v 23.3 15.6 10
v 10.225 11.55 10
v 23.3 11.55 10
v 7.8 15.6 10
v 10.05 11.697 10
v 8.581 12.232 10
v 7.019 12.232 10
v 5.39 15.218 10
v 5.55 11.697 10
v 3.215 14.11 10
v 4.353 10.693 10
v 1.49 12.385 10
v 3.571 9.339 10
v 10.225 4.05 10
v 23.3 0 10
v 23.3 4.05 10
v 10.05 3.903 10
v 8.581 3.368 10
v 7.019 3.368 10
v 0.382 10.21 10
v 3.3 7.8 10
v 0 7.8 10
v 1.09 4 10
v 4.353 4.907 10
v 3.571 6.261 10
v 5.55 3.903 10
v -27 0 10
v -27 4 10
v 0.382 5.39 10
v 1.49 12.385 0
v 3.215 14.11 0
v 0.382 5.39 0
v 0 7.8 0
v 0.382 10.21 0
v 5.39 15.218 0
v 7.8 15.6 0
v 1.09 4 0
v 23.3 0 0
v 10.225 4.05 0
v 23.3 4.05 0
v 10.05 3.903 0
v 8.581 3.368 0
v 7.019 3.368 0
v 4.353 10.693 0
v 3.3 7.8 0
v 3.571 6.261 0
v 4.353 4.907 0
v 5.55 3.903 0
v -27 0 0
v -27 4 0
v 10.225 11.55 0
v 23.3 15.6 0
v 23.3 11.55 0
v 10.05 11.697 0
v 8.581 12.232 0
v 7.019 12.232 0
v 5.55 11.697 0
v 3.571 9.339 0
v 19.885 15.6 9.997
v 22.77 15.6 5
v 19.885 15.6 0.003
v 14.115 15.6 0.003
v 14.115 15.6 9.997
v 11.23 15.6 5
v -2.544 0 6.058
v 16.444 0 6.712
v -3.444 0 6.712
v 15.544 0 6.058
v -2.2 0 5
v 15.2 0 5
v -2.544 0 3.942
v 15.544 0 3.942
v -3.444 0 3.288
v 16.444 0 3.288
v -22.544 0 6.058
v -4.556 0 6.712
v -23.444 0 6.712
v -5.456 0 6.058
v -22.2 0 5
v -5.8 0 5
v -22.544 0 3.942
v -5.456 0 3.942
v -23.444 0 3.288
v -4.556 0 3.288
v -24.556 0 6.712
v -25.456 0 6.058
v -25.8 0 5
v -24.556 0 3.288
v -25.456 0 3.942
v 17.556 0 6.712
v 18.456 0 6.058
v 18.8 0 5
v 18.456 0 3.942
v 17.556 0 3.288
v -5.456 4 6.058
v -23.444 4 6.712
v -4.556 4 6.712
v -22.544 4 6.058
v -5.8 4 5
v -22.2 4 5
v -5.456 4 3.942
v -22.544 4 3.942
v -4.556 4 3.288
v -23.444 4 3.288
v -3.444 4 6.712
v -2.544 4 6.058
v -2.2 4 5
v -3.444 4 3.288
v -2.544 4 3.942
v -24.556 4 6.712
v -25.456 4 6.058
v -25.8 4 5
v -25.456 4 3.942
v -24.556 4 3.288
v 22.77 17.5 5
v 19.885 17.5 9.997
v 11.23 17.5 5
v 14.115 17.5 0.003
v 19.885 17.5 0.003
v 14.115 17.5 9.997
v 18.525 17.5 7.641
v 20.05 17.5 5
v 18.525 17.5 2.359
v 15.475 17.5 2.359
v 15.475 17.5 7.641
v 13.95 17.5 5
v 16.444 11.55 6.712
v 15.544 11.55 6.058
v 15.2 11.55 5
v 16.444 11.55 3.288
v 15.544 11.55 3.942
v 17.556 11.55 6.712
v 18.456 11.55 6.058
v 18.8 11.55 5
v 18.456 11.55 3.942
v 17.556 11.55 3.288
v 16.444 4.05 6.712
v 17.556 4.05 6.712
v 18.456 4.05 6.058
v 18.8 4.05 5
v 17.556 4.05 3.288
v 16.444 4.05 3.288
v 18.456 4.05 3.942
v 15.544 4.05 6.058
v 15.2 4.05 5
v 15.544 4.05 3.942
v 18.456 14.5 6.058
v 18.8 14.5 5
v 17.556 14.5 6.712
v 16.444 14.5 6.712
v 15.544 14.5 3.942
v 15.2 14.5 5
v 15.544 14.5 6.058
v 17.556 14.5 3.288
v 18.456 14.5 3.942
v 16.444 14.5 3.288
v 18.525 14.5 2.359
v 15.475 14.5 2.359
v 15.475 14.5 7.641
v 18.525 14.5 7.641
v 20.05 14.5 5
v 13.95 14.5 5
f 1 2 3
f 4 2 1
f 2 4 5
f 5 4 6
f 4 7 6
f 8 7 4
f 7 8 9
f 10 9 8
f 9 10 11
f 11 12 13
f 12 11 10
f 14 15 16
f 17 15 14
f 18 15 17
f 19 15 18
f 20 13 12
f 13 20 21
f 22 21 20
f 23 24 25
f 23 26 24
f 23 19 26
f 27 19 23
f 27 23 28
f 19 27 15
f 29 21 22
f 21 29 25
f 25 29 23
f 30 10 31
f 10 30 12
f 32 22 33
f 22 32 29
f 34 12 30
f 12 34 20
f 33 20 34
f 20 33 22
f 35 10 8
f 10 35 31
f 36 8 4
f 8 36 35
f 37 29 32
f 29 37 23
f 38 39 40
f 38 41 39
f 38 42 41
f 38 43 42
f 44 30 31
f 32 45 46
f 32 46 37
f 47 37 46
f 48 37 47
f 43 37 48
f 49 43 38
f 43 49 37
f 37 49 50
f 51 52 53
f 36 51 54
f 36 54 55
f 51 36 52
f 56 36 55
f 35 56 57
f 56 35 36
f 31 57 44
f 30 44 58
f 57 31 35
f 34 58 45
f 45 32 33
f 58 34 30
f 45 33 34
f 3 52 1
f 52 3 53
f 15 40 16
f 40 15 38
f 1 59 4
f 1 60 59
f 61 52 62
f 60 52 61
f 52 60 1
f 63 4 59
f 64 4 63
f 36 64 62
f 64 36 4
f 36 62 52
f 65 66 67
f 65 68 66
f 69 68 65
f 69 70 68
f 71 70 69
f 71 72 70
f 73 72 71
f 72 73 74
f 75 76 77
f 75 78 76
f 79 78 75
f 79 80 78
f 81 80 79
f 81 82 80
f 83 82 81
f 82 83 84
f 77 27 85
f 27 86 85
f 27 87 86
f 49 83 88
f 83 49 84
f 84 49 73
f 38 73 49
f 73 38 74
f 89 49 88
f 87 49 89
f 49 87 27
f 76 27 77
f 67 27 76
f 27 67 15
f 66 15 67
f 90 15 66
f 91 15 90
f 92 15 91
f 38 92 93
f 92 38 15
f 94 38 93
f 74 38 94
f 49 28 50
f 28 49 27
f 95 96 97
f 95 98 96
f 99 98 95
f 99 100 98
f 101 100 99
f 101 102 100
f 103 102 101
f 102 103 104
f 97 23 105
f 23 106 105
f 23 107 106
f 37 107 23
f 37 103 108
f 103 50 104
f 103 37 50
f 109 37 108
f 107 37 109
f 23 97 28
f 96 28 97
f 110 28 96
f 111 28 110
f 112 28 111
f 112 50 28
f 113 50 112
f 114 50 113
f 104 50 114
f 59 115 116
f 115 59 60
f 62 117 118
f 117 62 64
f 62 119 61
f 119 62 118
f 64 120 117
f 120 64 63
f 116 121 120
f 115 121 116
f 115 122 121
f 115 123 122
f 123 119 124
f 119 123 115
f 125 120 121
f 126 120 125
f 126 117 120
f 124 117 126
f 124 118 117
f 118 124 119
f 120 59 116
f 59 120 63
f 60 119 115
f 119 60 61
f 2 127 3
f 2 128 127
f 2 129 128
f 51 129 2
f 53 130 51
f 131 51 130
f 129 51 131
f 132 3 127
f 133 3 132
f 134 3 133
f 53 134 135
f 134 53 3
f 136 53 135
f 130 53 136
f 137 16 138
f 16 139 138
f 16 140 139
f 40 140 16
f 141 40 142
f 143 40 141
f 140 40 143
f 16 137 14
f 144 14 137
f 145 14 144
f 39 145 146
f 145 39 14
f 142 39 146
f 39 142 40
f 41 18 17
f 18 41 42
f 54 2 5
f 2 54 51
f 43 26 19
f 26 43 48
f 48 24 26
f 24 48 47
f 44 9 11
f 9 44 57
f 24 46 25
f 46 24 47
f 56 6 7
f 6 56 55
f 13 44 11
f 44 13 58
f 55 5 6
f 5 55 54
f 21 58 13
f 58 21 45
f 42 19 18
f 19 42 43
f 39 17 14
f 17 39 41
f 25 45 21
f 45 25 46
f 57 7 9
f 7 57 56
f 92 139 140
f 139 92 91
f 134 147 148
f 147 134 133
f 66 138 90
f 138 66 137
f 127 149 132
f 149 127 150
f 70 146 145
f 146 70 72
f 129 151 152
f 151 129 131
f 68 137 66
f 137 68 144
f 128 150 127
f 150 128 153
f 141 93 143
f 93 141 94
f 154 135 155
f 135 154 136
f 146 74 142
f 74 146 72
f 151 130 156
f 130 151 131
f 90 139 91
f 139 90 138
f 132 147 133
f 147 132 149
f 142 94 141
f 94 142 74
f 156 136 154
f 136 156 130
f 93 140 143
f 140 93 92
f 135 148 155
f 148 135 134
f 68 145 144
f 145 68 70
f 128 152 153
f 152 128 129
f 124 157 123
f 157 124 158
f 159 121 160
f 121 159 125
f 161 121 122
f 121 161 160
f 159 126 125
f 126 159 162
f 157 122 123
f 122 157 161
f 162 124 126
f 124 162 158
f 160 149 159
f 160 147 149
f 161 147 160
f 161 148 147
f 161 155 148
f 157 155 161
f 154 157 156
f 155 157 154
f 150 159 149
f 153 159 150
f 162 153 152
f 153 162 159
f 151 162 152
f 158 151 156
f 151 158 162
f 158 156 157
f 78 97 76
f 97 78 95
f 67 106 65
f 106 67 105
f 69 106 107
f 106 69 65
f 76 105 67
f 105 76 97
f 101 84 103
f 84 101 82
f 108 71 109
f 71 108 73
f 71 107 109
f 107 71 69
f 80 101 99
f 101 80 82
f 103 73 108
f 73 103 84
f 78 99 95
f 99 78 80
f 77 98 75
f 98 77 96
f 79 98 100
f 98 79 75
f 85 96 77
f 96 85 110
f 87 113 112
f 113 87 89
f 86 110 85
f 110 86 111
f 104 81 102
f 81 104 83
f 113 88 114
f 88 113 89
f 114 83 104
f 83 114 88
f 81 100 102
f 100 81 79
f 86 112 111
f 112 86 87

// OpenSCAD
// file: functions.scad
// PRUSA Mendel  
// Functions used in many files
// GNU GPL v2
// Josef Průša
// josefprusa@me.com
// prusadjs.cz
// http://www.reprap.org/wiki/Prusa_Mendel
// http://github.com/prusajr/PrusaMendel

module nut(d,h,horizontal=true){
cornerdiameter =  (d / 2) / cos (180 / 6);
cylinder(h = h, r = cornerdiameter, $fn = 6);
if(horizontal){
for(i = [1:6]){
	rotate([0,0,60*i]) translate([-cornerdiameter-0.2,0,0]) rotate([0,0,-45]) cube(size = [2,2,h]);
}}
}

// By nophead
module polyhole(d,h) {
    n = max(round(2 * d),3);
    rotate([0,0,180])
        cylinder(h = h, r = (d / 2) / cos (180 / n), $fn = n);
}




module roundcorner(diameter){
	difference(){
		cube(size = [diameter,diameter,99], center = false);
		translate(v = [diameter, diameter, 0]) cylinder(h = 100, r=diameter, center=true);
	}
}
// file: metric.scad
// PRUSA Mendel  
// Default metric sizes
// GNU GPL v2
// Josef Průša
// josefprusa@me.com
// prusadjs.cz
// http://www.reprap.org/wiki/Prusa_Mendel
// http://github.com/prusajr/PrusaMendel

// DONT CHANGE THIS FILE! ALTER VALUES IN CONFIGURATION.SCAD INSTEAD

// RODS

threaded_rod_diameter = 8.2;
threaded_rod_diameter_horizontal = 8.2;
smooth_bar_diameter = 8;
smooth_bar_diameter_horizontal = 8.5;

// Nuts and bolts

m8_diameter = 9;
m8_nut_diameter = 16.4;

m4_diameter = 4.5;
m4_nut_diameter = 9;

m3_diameter = 3.6;
m3_nut_diameter = 6.1;
m3_nut_diameter_horizontal = 6.1;

// Bushing holder

bushing_core_diameter = smooth_bar_diameter;
bushing_material_thickness = 1;

// Motors

motor_shaft = 5.5;
// file: configuration.scad
// PRUSA Mendel  
// Configuration file
// GNU GPL v2
// Josef Průša
// josefprusa@me.com
// prusadjs.cz
// http://www.reprap.org/wiki/Prusa_Mendel
// http://github.com/prusajr/PrusaMendel

// PLEASE SELECT ONE OF THE CONFIGURATIONS BELOW
// BY UN-COMMENTING IT

// Uncomment for metric settings
// METRIC METRIC METRIC METRIC METRIC METRIC METRIC METRIC 

include <metric.scad>;

// Uncomment for imperial settings
// IMPERIAL IMPERIAL IMPERIAL IMPERIAL IMPERIAL IMPERIAL IMPERIAL 

//include <sae.scad>;

// CUSTOM CUSTOM CUSTOM CUSTOM CUSTOM CUSTOM CUSTOM CUSTOM CUSTOM

thin_wall = 3;

// LM8UU
linear = false;


// CHANGE ONLY THE STUFF YOU KNOW
// IT WILL REPLACE DEFAULT SETTING

// RODS

// threaded_rod_diameter = 0;
// threaded_rod_diameter_horizontal = 0;
// smooth_bar_díameter = 0;
// smooth_bar_díameter_horizontal = 0;

// Nuts and bolts

// m8_diameter = 0;
// m8_nut_diameter = 0;

// m4_diameter = 0;
// m4_nut_diameter = 0;

// m3_diameter = 0;
// m3_nut_diameter = 0;

// Bushing holder

// bushing_core_diameter = smooth_bar_díameter;
// bushing_material_thickness = 0;


///counted stuff
m3_nut_diameter_bigger = ((m3_nut_diameter  / 2) / cos (180 / 6))*2;

// functions 
include <functions.scad>
// main file
// PRUSA Mendel  
// Endstop holder
// Used to attach endstops to 8mm rods
// GNU GPL v3
// Josef Průša
// josefprusa@me.com
// prusadjs.cz
// http://www.reprap.org/wiki/Prusa_Mendel
// http://github.com/prusajr/PrusaMendel

include <configuration.scad>

/**
 * @id endstop-holder
 * @name Endstop holder
 * @category Printed
 * @using 1 m3x20xhex
 * @using 1 m3nut
 * @using 2 m3washer
 */
module endstop(){
outer_diameter = m8_diameter/2+3.3;
screw_hole_spacing = 20;
opening_size = m8_diameter-1.5; //openingsize

difference(){
	union(){


		translate([outer_diameter, outer_diameter, 0]) cylinder(h =10, r = outer_diameter, $fn = 20);
		translate([outer_diameter, 0, 0]) cube([15.5,outer_diameter*2,10]);
		translate([-27, 0, 0]) cube([35, 4, 10]);
		translate([17, 17.5, 5]) rotate([90, 0, 0]) cylinder(h =5, r = 5.77, $fn = 6);
	}




	translate([9, outer_diameter-opening_size/2, 0]) cube([18,opening_size,20]);
	translate([outer_diameter, outer_diameter, 0]) cylinder(h =20, r = m8_diameter/2, $fn = 18);

	//Securing hole
	translate([17, 17, 5]) rotate([90, 0, 0]) cylinder(h =20, r = m3_diameter/2, $fn = 10);
	translate([17, 19.5, 5]) rotate([90, 0, 0]) cylinder(h =5, r = m3_nut_diameter/2, $fn = 6);

	translate([17, 17, 5]) rotate([90, 0, 0]) cylinder(h =20, r = m3_diameter/2, $fn = 10);
	translate([-4, 17, 5]) rotate([90, 0, 0]) cylinder(h =20, r = m3_diameter/2, $fn = 10);
	translate([-(4+screw_hole_spacing), 17, 5]) rotate([90, 0, 0]) cylinder(h =20, r = m3_diameter/2, $fn = 10);
}
}
endstop();
